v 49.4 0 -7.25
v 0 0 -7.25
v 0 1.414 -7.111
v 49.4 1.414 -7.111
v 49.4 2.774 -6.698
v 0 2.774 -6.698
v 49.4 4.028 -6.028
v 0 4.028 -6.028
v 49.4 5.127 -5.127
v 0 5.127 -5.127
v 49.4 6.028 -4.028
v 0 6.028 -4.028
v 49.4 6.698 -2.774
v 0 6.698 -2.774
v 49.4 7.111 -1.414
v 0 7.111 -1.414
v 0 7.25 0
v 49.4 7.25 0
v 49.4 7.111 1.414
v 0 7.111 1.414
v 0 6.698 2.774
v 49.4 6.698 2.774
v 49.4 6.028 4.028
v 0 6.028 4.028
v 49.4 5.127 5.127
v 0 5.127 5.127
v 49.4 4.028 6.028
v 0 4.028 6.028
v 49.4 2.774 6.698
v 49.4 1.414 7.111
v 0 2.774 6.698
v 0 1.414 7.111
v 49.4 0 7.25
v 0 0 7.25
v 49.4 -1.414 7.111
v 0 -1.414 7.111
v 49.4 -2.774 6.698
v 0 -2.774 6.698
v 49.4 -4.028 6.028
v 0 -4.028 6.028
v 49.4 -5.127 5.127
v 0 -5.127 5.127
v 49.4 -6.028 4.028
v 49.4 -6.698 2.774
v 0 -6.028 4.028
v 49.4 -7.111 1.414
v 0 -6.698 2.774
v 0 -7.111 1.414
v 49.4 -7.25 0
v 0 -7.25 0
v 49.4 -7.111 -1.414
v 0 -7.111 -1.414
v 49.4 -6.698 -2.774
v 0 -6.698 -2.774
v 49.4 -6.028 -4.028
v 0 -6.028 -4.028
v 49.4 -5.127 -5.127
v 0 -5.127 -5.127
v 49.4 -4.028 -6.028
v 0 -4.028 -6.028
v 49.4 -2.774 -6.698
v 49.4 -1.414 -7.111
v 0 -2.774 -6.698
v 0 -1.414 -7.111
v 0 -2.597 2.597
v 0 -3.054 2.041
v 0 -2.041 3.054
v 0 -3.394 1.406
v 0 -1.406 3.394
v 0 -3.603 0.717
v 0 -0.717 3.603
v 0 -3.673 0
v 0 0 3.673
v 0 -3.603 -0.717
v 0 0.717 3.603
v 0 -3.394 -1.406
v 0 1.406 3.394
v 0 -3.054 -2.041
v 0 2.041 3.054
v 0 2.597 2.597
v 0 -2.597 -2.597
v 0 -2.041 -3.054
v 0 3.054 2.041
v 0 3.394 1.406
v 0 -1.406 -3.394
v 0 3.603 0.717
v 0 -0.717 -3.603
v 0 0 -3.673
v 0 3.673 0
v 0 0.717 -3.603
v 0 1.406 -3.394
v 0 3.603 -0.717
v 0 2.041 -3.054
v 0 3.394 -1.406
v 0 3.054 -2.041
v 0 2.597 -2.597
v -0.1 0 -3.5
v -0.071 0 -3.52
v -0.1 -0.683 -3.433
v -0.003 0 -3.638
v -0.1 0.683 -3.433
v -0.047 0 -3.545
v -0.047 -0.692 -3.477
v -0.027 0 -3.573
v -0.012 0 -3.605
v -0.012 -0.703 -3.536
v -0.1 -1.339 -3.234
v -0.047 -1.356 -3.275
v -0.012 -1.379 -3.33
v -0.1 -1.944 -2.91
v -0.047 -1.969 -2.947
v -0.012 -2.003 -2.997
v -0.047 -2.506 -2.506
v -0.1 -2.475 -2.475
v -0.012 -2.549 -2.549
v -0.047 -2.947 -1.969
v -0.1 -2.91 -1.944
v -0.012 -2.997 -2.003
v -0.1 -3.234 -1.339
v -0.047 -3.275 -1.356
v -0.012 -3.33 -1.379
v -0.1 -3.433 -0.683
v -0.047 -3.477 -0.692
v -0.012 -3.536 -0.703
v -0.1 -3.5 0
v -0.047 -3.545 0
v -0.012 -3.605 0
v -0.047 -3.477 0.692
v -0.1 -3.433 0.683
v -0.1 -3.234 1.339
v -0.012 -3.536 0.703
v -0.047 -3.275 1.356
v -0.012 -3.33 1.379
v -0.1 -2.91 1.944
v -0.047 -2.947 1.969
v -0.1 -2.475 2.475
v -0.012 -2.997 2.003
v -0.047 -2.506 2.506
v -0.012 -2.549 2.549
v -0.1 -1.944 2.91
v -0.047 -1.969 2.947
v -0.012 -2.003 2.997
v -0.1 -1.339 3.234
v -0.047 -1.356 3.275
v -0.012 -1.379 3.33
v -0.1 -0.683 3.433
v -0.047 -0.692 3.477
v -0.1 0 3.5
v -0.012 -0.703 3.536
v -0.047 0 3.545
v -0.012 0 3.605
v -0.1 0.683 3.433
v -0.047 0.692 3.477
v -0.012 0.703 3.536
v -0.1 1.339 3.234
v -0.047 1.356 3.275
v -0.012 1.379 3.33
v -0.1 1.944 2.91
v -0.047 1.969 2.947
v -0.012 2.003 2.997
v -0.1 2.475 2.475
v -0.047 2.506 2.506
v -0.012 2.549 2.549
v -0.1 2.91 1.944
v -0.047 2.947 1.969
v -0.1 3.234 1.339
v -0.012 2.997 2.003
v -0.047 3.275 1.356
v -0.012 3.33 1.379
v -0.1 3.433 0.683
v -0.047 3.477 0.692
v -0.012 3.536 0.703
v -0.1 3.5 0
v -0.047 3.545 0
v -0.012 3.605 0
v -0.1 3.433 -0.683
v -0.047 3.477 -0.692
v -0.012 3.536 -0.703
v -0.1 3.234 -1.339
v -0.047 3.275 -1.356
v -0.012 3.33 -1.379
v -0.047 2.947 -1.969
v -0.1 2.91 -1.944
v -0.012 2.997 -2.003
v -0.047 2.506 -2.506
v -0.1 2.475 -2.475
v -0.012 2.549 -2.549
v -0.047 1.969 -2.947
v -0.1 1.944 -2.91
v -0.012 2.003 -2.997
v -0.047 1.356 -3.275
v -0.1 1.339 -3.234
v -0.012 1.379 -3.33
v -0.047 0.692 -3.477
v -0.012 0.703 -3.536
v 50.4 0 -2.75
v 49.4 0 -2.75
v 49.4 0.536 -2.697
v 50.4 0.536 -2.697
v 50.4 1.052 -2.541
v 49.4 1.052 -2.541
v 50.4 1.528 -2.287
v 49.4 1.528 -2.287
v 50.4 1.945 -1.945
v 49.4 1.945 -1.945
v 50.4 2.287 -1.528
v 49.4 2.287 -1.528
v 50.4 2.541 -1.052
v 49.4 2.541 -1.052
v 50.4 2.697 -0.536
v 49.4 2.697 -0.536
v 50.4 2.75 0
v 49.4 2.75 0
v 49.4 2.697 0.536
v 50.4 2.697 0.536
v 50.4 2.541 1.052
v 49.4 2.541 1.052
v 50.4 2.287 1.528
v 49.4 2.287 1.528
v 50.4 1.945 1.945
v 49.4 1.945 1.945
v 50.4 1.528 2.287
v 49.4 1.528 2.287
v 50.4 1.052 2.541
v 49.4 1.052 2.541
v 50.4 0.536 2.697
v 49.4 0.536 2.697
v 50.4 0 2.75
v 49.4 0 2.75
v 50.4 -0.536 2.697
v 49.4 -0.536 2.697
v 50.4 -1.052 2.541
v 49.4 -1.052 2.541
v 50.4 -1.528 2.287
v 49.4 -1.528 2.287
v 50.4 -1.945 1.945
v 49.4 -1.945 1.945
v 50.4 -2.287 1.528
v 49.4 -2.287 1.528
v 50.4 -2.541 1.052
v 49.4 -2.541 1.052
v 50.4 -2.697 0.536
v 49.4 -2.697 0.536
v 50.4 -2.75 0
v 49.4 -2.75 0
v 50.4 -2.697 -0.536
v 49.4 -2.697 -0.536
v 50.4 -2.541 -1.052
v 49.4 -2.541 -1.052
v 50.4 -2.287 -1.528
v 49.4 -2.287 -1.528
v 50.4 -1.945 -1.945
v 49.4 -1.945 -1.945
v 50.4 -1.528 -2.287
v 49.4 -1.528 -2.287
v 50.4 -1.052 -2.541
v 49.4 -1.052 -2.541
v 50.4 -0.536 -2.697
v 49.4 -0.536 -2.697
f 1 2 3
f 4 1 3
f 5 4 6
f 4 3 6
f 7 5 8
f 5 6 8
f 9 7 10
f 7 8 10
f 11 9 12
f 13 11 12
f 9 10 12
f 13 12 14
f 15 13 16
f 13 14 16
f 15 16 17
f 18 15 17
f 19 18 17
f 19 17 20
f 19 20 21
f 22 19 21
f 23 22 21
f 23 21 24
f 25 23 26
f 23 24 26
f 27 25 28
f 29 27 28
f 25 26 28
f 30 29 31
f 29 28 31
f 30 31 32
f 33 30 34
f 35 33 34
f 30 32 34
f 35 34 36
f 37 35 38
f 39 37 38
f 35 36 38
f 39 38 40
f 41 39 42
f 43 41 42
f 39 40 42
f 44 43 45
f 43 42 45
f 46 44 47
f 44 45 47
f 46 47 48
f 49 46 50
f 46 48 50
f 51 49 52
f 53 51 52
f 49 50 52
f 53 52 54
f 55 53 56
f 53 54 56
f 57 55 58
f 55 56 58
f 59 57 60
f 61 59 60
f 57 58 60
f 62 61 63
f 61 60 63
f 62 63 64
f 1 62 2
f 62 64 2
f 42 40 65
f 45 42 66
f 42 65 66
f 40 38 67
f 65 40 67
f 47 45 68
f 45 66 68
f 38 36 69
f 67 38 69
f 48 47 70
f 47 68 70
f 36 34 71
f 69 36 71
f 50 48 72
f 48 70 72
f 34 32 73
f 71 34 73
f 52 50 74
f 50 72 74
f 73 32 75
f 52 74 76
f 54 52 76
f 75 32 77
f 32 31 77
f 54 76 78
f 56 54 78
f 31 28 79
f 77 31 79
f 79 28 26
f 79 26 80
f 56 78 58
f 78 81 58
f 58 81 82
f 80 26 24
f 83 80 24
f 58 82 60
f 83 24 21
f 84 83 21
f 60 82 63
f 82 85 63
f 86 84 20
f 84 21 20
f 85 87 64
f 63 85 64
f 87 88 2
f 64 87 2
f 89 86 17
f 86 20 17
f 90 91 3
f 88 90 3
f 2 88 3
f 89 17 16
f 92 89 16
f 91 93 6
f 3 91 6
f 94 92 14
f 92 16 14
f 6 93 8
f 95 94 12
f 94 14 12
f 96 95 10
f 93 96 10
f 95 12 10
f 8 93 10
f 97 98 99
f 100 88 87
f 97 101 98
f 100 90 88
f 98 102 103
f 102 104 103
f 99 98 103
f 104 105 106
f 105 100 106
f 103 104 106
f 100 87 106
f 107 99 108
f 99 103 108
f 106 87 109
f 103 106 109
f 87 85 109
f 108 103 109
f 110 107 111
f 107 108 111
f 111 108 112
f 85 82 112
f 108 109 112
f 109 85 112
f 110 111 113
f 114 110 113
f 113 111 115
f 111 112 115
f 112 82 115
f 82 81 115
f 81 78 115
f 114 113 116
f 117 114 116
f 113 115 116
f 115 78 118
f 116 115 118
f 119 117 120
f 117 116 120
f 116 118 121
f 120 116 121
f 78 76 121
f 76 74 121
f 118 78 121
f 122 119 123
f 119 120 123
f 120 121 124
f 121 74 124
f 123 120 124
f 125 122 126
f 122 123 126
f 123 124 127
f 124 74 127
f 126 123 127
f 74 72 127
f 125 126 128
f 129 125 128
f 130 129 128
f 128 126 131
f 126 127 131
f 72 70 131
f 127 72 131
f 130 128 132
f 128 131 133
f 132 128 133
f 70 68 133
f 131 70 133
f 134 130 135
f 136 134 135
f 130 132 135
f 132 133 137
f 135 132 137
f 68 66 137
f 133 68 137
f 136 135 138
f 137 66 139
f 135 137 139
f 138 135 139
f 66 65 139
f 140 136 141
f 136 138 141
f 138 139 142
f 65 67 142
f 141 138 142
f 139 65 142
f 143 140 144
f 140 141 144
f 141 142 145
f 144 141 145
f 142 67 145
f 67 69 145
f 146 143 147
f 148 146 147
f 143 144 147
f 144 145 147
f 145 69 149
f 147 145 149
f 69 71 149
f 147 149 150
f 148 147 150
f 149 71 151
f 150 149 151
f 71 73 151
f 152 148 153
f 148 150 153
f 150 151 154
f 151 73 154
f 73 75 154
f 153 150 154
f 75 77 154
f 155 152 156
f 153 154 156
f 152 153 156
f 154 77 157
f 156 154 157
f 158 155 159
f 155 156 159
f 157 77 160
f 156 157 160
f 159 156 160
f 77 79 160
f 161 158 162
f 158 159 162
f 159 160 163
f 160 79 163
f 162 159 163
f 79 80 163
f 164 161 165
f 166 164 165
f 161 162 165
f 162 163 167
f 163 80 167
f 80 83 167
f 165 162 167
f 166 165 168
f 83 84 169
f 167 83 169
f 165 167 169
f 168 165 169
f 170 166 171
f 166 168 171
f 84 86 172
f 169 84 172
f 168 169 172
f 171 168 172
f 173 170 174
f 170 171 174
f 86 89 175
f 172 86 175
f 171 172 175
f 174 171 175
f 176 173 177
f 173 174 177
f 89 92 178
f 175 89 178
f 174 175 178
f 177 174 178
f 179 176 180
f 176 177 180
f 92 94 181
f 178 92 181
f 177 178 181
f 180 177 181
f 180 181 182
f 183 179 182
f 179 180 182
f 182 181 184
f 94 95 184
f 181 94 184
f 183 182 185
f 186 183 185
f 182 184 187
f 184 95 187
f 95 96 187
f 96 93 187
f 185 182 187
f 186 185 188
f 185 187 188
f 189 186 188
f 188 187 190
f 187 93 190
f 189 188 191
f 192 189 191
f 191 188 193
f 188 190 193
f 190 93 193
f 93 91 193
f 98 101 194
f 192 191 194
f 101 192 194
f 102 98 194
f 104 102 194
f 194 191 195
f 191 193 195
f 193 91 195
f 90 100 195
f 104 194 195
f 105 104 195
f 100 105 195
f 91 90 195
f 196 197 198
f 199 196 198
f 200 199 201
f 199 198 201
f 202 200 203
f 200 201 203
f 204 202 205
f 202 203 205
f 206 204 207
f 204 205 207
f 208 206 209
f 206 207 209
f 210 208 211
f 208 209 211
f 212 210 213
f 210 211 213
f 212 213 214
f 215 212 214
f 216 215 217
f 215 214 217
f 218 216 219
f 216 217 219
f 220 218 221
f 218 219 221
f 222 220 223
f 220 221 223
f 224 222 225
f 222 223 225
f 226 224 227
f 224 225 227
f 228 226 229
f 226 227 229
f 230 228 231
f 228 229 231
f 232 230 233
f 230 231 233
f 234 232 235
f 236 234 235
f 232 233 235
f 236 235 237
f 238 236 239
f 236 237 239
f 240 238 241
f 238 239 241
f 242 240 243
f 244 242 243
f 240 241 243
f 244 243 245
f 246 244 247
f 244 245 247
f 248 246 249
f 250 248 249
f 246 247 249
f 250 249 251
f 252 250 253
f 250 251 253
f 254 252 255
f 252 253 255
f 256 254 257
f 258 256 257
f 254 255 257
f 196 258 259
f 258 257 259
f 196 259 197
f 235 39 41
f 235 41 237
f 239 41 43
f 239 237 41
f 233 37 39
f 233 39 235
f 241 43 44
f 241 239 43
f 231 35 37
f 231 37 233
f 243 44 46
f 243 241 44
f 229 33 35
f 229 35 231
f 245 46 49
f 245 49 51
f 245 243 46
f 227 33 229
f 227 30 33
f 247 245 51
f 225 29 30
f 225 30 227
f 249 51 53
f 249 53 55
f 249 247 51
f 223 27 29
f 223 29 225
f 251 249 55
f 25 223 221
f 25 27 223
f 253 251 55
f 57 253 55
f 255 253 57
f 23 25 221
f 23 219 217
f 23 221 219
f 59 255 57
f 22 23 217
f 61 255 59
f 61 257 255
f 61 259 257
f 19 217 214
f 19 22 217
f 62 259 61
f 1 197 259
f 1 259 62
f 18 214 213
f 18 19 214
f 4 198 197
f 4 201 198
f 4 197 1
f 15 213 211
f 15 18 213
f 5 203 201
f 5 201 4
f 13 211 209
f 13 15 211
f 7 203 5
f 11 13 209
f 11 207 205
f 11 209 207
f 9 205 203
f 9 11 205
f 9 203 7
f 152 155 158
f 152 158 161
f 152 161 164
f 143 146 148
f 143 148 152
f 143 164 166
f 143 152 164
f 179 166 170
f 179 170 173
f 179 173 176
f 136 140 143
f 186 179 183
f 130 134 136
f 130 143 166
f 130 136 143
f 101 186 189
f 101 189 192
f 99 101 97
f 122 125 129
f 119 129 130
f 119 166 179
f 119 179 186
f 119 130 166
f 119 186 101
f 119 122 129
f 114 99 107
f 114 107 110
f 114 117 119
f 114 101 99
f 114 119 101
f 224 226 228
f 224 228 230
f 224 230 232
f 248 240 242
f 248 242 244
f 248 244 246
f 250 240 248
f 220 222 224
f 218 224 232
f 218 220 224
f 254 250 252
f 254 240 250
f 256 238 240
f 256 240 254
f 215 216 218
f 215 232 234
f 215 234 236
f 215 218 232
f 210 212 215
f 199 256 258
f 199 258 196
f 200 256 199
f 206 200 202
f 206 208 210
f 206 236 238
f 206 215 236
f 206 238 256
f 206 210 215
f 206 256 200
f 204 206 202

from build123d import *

# Parameters (mm, degrees)
SKETCH1_R           = 7.25
BOSS_EXTRUDE1_DEPTH = 49.4
SKETCH2_R           = 2.75
BOSS_EXTRUDE2_DEPTH = 1
SKETCH3_R           = 3.5
BOSS_EXTRUDE3_DEPTH = 0.1
FILLET1_R           = 0.2


with BuildPart() as part:
    # Sketch1 → Boss-Extrude1 (new body)
    with BuildSketch(Plane(origin=(0, 0, 0), x_dir=(0, 0, -1), z_dir=(1, 0, 0))):
        Circle(SKETCH1_R)
    extrude(amount=BOSS_EXTRUDE1_DEPTH)

    # Sketch2 → Boss-Extrude2 (add)
    with BuildSketch(Plane(origin=(49.4, 0, 0), x_dir=(0, 0, -1), z_dir=(1, 0, 0))):
        Circle(SKETCH2_R)
    extrude(amount=BOSS_EXTRUDE2_DEPTH)

    # Sketch3 → Boss-Extrude3 (add)
    with BuildSketch(Plane.ZY):
        with Locations(Location((0, 0, 0), (0, 0, 180))):
            Circle(SKETCH3_R)
    extrude(amount=BOSS_EXTRUDE3_DEPTH)

    # Fillet1
    # the kernel refuses this fillet: 0.2 mm, written as the material it adds along each edge
    with BuildSketch(Plane(origin=(0, 0, 0), x_dir=(0, 0, -1), z_dir=(0, 1, 0))) as fillet1_piece_1:
        with BuildLine():
            CenterArc((3.673205081, 0.2), FILLET1_R, 210, 60)
            Line((3.5, 0.1), (3.496535898, 0.098))
            ThreePointArc((3.496535898, 0.098), (3.496, 0.05), (3.496, 0))
            Line((3.496, 0), (3.5, -0.004))
            Line((3.5, -0.004), (3.673205081, -0.004))
            Line((3.673205081, -0.004), (3.673205081, 0))
        make_face()
    revolve(axis=Axis((0, 0, 0), (-1, 0, 0)))


solid = part.part
